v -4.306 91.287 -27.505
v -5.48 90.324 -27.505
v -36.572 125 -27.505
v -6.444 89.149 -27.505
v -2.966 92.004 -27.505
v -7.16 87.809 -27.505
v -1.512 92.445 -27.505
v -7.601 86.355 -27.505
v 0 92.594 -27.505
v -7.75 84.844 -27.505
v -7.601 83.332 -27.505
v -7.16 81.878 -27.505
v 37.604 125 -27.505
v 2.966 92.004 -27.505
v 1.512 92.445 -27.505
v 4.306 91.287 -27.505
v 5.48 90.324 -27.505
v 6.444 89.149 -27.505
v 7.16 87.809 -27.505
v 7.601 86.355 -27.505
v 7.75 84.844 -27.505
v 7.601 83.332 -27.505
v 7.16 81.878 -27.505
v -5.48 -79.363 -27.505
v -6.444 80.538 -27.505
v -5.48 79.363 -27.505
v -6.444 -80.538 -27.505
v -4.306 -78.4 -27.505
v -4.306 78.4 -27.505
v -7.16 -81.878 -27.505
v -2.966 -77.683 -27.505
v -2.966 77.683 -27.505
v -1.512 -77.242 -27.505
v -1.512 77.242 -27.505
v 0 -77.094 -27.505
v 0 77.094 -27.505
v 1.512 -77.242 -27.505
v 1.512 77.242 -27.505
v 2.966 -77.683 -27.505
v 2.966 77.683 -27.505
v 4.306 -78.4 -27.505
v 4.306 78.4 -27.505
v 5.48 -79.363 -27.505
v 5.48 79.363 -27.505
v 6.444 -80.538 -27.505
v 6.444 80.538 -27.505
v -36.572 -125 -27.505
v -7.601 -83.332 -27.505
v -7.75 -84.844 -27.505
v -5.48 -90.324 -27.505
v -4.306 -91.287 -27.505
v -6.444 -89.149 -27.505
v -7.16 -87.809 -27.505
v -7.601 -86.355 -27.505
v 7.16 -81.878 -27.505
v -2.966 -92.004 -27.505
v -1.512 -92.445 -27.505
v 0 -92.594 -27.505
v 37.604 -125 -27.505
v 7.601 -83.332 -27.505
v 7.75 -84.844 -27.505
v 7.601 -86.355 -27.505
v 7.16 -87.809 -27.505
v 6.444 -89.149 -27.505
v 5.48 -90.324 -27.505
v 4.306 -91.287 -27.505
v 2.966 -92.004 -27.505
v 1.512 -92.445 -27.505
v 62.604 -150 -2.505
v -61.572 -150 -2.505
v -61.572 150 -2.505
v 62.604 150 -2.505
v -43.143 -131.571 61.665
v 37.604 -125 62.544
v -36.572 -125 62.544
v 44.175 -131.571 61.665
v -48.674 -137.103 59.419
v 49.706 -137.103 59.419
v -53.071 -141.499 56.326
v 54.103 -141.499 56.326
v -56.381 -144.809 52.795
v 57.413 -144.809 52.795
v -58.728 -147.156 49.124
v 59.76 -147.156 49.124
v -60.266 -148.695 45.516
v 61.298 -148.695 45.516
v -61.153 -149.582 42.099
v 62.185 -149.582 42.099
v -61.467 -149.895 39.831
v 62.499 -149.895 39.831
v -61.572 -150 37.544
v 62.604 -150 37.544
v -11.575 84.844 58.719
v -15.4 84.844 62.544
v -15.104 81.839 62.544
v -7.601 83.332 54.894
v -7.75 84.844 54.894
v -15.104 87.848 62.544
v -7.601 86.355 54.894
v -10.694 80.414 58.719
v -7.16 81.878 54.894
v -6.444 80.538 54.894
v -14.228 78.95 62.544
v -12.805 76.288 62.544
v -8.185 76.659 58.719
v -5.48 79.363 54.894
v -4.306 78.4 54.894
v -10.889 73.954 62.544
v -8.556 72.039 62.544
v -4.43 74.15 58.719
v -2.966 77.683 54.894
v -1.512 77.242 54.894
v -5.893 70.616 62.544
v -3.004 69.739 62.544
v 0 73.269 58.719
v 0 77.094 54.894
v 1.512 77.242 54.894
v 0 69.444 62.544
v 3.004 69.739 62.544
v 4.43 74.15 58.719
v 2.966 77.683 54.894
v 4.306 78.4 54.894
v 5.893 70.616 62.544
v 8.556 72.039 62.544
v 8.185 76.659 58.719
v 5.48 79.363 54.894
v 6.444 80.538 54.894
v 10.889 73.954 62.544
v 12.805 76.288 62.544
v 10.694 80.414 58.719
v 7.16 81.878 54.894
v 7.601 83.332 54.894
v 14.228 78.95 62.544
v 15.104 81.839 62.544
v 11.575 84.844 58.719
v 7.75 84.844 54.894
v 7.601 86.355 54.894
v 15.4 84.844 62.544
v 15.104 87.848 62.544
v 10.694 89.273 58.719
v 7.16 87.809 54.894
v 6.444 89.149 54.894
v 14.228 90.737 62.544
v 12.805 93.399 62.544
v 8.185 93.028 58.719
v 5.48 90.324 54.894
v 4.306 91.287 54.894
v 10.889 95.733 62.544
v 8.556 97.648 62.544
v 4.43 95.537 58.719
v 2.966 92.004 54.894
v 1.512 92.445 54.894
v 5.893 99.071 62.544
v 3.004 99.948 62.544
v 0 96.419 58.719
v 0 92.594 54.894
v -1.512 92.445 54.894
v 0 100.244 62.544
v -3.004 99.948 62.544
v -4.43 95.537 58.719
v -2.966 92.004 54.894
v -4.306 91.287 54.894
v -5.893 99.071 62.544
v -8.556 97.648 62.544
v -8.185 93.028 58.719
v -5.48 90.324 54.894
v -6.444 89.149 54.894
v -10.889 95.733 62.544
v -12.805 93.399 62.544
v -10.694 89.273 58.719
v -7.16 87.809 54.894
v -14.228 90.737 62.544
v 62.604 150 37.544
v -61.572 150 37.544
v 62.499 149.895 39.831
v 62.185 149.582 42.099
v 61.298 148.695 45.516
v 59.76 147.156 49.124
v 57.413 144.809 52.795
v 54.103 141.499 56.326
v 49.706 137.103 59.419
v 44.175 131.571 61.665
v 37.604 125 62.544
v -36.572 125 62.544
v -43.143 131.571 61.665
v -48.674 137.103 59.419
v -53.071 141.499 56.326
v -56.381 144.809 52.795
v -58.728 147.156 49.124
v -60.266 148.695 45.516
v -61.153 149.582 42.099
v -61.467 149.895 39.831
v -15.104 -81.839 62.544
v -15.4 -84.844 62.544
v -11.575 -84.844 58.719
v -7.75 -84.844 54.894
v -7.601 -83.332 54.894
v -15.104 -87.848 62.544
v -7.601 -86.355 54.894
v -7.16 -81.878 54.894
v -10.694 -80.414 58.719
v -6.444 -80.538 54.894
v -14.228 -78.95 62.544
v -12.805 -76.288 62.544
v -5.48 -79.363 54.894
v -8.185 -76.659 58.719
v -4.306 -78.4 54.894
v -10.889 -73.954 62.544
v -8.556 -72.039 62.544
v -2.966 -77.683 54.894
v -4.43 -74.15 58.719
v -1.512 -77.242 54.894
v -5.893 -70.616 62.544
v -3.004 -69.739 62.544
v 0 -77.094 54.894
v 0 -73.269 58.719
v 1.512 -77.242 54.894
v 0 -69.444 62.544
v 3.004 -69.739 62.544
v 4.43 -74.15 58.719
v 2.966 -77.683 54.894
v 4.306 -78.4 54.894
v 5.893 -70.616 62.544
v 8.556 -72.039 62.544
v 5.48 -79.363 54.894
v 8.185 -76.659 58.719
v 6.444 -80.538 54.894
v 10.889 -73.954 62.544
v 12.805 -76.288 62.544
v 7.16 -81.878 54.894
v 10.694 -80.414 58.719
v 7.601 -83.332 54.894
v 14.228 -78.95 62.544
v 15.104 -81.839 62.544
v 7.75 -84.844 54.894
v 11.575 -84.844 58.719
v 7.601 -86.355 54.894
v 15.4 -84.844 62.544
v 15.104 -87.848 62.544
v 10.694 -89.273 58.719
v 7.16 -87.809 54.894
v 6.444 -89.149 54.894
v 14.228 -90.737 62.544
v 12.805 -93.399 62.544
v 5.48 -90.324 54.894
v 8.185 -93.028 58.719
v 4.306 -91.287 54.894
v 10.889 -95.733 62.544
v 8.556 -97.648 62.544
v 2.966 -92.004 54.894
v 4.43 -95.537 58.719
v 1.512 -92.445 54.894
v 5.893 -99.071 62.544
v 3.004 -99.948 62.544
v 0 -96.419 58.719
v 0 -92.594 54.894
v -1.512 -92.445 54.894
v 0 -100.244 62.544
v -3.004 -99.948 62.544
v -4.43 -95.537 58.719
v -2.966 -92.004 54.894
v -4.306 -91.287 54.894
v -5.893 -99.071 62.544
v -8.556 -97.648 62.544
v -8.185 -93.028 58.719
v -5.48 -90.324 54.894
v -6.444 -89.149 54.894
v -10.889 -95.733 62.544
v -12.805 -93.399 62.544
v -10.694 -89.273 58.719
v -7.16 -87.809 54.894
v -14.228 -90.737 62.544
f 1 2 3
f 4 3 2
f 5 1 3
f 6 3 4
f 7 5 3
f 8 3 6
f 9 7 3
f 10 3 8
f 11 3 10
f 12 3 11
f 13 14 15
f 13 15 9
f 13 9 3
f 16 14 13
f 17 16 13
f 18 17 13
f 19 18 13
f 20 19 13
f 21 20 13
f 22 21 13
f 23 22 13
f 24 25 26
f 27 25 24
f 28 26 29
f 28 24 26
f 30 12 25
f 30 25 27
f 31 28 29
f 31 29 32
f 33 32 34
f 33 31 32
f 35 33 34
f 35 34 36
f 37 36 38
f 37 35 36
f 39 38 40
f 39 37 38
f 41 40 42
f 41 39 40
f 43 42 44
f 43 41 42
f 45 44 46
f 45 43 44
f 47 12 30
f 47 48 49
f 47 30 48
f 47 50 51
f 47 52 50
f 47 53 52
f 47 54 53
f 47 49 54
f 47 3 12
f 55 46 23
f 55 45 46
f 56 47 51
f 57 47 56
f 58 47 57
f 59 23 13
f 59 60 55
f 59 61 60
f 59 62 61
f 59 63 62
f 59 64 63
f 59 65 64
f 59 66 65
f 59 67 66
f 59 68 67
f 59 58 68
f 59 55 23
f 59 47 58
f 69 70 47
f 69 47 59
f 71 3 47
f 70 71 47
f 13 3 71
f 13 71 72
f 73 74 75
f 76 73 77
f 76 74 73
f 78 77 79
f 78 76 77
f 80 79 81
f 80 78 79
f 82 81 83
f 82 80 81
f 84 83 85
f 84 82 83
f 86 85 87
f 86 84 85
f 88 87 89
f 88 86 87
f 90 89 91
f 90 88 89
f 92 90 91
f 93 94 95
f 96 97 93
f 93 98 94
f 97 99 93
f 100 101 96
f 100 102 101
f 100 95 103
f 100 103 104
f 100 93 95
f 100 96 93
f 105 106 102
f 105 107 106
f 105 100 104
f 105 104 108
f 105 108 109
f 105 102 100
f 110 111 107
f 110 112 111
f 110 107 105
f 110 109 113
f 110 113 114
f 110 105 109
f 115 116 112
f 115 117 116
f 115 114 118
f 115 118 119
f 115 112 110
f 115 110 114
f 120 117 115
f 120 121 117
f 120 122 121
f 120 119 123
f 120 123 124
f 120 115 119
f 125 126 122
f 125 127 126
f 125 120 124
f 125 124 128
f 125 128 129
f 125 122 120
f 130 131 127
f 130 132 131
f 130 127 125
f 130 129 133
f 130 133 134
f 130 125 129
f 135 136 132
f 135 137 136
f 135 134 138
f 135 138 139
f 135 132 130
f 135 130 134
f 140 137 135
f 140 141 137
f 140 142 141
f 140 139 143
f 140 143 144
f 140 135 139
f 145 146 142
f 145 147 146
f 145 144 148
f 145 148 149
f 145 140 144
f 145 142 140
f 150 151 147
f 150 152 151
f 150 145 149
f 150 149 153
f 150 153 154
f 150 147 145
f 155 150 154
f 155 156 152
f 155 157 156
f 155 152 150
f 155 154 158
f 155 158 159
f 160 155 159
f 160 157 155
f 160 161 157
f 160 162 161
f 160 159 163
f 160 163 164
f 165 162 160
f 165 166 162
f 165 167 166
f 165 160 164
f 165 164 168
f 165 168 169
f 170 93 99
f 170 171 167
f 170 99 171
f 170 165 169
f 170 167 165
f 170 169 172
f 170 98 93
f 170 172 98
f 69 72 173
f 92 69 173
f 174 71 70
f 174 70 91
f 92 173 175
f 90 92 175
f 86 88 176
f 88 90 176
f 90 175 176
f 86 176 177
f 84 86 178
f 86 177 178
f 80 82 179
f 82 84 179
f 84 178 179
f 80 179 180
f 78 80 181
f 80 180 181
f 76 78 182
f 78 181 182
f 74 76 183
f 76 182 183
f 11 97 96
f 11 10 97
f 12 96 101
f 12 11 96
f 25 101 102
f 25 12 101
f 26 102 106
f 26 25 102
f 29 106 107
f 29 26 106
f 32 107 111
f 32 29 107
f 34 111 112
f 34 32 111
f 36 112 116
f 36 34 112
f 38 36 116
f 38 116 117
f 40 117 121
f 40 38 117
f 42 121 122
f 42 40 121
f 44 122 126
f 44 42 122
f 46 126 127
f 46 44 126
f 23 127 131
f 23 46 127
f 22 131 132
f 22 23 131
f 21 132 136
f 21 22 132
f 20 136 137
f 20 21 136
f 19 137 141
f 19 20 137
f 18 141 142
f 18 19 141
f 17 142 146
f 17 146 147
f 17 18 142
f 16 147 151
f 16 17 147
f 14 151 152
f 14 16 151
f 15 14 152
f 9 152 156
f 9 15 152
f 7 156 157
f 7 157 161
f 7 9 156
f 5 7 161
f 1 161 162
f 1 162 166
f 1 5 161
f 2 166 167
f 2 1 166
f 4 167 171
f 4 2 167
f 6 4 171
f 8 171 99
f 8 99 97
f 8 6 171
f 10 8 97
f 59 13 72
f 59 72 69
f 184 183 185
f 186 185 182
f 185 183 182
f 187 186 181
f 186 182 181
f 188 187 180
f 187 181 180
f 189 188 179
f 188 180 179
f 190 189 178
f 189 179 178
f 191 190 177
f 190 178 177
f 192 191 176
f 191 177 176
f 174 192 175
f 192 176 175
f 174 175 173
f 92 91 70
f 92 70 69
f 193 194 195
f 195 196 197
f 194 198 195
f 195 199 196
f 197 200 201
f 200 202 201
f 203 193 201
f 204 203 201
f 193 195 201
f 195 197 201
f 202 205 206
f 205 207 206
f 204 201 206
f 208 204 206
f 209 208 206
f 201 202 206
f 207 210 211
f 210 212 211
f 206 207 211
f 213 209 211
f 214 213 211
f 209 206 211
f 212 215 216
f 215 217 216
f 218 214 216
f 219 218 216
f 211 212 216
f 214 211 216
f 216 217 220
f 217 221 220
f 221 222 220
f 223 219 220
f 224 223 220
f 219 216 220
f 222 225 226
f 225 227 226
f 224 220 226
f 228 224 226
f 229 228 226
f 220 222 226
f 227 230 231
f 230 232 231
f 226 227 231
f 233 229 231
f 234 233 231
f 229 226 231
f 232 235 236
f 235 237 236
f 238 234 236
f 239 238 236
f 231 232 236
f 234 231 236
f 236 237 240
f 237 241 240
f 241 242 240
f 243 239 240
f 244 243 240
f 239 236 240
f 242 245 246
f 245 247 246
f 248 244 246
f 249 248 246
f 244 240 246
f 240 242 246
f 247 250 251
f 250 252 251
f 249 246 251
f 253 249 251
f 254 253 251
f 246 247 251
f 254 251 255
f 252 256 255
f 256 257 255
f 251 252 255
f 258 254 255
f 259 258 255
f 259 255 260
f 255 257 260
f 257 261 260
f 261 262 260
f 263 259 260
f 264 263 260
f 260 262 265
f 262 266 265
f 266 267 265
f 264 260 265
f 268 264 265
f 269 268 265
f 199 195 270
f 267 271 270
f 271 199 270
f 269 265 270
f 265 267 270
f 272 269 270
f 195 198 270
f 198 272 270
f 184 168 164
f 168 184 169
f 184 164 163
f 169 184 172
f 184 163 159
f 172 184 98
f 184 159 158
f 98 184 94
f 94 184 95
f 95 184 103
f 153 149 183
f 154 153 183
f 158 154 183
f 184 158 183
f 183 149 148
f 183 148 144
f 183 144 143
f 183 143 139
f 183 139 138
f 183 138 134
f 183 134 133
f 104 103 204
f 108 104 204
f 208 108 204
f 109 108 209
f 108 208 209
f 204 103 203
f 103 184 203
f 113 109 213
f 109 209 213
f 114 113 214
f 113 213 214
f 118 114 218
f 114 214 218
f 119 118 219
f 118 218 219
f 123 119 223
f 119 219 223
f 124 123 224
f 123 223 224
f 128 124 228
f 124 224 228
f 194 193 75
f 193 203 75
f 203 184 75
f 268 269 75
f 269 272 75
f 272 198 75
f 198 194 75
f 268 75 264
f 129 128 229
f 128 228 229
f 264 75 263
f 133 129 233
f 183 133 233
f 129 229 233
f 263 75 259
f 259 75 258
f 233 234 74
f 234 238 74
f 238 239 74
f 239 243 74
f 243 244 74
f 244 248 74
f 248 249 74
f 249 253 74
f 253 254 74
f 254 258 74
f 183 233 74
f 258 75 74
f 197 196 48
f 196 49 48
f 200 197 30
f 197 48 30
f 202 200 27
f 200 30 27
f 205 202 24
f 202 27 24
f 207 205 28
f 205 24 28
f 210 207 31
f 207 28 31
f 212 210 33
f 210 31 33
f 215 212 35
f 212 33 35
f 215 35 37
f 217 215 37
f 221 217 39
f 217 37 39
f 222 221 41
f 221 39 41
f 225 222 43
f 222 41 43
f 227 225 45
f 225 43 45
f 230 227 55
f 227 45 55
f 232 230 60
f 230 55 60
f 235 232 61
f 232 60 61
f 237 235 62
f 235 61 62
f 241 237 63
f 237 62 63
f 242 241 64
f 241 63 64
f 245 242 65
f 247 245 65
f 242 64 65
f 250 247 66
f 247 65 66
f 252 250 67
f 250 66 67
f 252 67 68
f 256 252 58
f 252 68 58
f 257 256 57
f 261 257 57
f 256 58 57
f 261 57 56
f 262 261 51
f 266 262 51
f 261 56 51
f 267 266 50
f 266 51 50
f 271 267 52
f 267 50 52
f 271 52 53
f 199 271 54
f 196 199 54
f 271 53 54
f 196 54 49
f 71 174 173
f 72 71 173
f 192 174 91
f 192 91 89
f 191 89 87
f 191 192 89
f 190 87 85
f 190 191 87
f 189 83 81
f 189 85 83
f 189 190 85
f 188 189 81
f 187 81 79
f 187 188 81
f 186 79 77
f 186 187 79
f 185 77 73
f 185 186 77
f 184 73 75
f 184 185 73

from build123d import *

# Parameters (mm, degrees)
F0_W           = 124.1753287613
F0_H           = 90.0488961488
F1_DEPTH       = 150
F2_R           = 25
F4_D           = 15.5
F4_CSINK_D     = 30.8
F4_CSINK_ANGLE = 90
F6_SIZE        = 25


with BuildPart() as f1:
    # F0 (on Front) → F1 (new body)
    with BuildSketch(Plane.XZ):
        with Locations((0.5159582943, 17.5197338685)):
            Rectangle(F0_W, F0_H)
    extrude(amount=F1_DEPTH)

    # F2
    f2_edges = [f1.edges().sort_by_distance(p)[0] for p in [
        (0.515958, -150, 62.544182),
        (62.603623, -75, 62.544182),
        (-61.571706, -75, 62.544182),
    ]]
    fillet(f2_edges, radius=F2_R)

    # F4 (through all)
    with Locations(Plane.XY.offset(62.5441819429)):
        with Locations((0, -84.8435163498)):
            CounterSinkHole(F4_D / 2, F4_CSINK_D / 2, counter_sink_angle=F4_CSINK_ANGLE)

    # F5: F1 across plane


with BuildPart() as f1_1:
    add(f1.part)
    add(f1.part.mirror(Plane.XZ))

    # F6
    f6_edges = [f1_1.edges().sort_by_distance(p)[0] for p in [
        (62.603623, 0, -27.504714),
        (0.515958, 150, -27.504714),
        (0.515958, -150, -27.504714),
        (-61.571706, 0, -27.504714),
    ]]
    chamfer(f6_edges, length=F6_SIZE)


solid = f1_1.part
